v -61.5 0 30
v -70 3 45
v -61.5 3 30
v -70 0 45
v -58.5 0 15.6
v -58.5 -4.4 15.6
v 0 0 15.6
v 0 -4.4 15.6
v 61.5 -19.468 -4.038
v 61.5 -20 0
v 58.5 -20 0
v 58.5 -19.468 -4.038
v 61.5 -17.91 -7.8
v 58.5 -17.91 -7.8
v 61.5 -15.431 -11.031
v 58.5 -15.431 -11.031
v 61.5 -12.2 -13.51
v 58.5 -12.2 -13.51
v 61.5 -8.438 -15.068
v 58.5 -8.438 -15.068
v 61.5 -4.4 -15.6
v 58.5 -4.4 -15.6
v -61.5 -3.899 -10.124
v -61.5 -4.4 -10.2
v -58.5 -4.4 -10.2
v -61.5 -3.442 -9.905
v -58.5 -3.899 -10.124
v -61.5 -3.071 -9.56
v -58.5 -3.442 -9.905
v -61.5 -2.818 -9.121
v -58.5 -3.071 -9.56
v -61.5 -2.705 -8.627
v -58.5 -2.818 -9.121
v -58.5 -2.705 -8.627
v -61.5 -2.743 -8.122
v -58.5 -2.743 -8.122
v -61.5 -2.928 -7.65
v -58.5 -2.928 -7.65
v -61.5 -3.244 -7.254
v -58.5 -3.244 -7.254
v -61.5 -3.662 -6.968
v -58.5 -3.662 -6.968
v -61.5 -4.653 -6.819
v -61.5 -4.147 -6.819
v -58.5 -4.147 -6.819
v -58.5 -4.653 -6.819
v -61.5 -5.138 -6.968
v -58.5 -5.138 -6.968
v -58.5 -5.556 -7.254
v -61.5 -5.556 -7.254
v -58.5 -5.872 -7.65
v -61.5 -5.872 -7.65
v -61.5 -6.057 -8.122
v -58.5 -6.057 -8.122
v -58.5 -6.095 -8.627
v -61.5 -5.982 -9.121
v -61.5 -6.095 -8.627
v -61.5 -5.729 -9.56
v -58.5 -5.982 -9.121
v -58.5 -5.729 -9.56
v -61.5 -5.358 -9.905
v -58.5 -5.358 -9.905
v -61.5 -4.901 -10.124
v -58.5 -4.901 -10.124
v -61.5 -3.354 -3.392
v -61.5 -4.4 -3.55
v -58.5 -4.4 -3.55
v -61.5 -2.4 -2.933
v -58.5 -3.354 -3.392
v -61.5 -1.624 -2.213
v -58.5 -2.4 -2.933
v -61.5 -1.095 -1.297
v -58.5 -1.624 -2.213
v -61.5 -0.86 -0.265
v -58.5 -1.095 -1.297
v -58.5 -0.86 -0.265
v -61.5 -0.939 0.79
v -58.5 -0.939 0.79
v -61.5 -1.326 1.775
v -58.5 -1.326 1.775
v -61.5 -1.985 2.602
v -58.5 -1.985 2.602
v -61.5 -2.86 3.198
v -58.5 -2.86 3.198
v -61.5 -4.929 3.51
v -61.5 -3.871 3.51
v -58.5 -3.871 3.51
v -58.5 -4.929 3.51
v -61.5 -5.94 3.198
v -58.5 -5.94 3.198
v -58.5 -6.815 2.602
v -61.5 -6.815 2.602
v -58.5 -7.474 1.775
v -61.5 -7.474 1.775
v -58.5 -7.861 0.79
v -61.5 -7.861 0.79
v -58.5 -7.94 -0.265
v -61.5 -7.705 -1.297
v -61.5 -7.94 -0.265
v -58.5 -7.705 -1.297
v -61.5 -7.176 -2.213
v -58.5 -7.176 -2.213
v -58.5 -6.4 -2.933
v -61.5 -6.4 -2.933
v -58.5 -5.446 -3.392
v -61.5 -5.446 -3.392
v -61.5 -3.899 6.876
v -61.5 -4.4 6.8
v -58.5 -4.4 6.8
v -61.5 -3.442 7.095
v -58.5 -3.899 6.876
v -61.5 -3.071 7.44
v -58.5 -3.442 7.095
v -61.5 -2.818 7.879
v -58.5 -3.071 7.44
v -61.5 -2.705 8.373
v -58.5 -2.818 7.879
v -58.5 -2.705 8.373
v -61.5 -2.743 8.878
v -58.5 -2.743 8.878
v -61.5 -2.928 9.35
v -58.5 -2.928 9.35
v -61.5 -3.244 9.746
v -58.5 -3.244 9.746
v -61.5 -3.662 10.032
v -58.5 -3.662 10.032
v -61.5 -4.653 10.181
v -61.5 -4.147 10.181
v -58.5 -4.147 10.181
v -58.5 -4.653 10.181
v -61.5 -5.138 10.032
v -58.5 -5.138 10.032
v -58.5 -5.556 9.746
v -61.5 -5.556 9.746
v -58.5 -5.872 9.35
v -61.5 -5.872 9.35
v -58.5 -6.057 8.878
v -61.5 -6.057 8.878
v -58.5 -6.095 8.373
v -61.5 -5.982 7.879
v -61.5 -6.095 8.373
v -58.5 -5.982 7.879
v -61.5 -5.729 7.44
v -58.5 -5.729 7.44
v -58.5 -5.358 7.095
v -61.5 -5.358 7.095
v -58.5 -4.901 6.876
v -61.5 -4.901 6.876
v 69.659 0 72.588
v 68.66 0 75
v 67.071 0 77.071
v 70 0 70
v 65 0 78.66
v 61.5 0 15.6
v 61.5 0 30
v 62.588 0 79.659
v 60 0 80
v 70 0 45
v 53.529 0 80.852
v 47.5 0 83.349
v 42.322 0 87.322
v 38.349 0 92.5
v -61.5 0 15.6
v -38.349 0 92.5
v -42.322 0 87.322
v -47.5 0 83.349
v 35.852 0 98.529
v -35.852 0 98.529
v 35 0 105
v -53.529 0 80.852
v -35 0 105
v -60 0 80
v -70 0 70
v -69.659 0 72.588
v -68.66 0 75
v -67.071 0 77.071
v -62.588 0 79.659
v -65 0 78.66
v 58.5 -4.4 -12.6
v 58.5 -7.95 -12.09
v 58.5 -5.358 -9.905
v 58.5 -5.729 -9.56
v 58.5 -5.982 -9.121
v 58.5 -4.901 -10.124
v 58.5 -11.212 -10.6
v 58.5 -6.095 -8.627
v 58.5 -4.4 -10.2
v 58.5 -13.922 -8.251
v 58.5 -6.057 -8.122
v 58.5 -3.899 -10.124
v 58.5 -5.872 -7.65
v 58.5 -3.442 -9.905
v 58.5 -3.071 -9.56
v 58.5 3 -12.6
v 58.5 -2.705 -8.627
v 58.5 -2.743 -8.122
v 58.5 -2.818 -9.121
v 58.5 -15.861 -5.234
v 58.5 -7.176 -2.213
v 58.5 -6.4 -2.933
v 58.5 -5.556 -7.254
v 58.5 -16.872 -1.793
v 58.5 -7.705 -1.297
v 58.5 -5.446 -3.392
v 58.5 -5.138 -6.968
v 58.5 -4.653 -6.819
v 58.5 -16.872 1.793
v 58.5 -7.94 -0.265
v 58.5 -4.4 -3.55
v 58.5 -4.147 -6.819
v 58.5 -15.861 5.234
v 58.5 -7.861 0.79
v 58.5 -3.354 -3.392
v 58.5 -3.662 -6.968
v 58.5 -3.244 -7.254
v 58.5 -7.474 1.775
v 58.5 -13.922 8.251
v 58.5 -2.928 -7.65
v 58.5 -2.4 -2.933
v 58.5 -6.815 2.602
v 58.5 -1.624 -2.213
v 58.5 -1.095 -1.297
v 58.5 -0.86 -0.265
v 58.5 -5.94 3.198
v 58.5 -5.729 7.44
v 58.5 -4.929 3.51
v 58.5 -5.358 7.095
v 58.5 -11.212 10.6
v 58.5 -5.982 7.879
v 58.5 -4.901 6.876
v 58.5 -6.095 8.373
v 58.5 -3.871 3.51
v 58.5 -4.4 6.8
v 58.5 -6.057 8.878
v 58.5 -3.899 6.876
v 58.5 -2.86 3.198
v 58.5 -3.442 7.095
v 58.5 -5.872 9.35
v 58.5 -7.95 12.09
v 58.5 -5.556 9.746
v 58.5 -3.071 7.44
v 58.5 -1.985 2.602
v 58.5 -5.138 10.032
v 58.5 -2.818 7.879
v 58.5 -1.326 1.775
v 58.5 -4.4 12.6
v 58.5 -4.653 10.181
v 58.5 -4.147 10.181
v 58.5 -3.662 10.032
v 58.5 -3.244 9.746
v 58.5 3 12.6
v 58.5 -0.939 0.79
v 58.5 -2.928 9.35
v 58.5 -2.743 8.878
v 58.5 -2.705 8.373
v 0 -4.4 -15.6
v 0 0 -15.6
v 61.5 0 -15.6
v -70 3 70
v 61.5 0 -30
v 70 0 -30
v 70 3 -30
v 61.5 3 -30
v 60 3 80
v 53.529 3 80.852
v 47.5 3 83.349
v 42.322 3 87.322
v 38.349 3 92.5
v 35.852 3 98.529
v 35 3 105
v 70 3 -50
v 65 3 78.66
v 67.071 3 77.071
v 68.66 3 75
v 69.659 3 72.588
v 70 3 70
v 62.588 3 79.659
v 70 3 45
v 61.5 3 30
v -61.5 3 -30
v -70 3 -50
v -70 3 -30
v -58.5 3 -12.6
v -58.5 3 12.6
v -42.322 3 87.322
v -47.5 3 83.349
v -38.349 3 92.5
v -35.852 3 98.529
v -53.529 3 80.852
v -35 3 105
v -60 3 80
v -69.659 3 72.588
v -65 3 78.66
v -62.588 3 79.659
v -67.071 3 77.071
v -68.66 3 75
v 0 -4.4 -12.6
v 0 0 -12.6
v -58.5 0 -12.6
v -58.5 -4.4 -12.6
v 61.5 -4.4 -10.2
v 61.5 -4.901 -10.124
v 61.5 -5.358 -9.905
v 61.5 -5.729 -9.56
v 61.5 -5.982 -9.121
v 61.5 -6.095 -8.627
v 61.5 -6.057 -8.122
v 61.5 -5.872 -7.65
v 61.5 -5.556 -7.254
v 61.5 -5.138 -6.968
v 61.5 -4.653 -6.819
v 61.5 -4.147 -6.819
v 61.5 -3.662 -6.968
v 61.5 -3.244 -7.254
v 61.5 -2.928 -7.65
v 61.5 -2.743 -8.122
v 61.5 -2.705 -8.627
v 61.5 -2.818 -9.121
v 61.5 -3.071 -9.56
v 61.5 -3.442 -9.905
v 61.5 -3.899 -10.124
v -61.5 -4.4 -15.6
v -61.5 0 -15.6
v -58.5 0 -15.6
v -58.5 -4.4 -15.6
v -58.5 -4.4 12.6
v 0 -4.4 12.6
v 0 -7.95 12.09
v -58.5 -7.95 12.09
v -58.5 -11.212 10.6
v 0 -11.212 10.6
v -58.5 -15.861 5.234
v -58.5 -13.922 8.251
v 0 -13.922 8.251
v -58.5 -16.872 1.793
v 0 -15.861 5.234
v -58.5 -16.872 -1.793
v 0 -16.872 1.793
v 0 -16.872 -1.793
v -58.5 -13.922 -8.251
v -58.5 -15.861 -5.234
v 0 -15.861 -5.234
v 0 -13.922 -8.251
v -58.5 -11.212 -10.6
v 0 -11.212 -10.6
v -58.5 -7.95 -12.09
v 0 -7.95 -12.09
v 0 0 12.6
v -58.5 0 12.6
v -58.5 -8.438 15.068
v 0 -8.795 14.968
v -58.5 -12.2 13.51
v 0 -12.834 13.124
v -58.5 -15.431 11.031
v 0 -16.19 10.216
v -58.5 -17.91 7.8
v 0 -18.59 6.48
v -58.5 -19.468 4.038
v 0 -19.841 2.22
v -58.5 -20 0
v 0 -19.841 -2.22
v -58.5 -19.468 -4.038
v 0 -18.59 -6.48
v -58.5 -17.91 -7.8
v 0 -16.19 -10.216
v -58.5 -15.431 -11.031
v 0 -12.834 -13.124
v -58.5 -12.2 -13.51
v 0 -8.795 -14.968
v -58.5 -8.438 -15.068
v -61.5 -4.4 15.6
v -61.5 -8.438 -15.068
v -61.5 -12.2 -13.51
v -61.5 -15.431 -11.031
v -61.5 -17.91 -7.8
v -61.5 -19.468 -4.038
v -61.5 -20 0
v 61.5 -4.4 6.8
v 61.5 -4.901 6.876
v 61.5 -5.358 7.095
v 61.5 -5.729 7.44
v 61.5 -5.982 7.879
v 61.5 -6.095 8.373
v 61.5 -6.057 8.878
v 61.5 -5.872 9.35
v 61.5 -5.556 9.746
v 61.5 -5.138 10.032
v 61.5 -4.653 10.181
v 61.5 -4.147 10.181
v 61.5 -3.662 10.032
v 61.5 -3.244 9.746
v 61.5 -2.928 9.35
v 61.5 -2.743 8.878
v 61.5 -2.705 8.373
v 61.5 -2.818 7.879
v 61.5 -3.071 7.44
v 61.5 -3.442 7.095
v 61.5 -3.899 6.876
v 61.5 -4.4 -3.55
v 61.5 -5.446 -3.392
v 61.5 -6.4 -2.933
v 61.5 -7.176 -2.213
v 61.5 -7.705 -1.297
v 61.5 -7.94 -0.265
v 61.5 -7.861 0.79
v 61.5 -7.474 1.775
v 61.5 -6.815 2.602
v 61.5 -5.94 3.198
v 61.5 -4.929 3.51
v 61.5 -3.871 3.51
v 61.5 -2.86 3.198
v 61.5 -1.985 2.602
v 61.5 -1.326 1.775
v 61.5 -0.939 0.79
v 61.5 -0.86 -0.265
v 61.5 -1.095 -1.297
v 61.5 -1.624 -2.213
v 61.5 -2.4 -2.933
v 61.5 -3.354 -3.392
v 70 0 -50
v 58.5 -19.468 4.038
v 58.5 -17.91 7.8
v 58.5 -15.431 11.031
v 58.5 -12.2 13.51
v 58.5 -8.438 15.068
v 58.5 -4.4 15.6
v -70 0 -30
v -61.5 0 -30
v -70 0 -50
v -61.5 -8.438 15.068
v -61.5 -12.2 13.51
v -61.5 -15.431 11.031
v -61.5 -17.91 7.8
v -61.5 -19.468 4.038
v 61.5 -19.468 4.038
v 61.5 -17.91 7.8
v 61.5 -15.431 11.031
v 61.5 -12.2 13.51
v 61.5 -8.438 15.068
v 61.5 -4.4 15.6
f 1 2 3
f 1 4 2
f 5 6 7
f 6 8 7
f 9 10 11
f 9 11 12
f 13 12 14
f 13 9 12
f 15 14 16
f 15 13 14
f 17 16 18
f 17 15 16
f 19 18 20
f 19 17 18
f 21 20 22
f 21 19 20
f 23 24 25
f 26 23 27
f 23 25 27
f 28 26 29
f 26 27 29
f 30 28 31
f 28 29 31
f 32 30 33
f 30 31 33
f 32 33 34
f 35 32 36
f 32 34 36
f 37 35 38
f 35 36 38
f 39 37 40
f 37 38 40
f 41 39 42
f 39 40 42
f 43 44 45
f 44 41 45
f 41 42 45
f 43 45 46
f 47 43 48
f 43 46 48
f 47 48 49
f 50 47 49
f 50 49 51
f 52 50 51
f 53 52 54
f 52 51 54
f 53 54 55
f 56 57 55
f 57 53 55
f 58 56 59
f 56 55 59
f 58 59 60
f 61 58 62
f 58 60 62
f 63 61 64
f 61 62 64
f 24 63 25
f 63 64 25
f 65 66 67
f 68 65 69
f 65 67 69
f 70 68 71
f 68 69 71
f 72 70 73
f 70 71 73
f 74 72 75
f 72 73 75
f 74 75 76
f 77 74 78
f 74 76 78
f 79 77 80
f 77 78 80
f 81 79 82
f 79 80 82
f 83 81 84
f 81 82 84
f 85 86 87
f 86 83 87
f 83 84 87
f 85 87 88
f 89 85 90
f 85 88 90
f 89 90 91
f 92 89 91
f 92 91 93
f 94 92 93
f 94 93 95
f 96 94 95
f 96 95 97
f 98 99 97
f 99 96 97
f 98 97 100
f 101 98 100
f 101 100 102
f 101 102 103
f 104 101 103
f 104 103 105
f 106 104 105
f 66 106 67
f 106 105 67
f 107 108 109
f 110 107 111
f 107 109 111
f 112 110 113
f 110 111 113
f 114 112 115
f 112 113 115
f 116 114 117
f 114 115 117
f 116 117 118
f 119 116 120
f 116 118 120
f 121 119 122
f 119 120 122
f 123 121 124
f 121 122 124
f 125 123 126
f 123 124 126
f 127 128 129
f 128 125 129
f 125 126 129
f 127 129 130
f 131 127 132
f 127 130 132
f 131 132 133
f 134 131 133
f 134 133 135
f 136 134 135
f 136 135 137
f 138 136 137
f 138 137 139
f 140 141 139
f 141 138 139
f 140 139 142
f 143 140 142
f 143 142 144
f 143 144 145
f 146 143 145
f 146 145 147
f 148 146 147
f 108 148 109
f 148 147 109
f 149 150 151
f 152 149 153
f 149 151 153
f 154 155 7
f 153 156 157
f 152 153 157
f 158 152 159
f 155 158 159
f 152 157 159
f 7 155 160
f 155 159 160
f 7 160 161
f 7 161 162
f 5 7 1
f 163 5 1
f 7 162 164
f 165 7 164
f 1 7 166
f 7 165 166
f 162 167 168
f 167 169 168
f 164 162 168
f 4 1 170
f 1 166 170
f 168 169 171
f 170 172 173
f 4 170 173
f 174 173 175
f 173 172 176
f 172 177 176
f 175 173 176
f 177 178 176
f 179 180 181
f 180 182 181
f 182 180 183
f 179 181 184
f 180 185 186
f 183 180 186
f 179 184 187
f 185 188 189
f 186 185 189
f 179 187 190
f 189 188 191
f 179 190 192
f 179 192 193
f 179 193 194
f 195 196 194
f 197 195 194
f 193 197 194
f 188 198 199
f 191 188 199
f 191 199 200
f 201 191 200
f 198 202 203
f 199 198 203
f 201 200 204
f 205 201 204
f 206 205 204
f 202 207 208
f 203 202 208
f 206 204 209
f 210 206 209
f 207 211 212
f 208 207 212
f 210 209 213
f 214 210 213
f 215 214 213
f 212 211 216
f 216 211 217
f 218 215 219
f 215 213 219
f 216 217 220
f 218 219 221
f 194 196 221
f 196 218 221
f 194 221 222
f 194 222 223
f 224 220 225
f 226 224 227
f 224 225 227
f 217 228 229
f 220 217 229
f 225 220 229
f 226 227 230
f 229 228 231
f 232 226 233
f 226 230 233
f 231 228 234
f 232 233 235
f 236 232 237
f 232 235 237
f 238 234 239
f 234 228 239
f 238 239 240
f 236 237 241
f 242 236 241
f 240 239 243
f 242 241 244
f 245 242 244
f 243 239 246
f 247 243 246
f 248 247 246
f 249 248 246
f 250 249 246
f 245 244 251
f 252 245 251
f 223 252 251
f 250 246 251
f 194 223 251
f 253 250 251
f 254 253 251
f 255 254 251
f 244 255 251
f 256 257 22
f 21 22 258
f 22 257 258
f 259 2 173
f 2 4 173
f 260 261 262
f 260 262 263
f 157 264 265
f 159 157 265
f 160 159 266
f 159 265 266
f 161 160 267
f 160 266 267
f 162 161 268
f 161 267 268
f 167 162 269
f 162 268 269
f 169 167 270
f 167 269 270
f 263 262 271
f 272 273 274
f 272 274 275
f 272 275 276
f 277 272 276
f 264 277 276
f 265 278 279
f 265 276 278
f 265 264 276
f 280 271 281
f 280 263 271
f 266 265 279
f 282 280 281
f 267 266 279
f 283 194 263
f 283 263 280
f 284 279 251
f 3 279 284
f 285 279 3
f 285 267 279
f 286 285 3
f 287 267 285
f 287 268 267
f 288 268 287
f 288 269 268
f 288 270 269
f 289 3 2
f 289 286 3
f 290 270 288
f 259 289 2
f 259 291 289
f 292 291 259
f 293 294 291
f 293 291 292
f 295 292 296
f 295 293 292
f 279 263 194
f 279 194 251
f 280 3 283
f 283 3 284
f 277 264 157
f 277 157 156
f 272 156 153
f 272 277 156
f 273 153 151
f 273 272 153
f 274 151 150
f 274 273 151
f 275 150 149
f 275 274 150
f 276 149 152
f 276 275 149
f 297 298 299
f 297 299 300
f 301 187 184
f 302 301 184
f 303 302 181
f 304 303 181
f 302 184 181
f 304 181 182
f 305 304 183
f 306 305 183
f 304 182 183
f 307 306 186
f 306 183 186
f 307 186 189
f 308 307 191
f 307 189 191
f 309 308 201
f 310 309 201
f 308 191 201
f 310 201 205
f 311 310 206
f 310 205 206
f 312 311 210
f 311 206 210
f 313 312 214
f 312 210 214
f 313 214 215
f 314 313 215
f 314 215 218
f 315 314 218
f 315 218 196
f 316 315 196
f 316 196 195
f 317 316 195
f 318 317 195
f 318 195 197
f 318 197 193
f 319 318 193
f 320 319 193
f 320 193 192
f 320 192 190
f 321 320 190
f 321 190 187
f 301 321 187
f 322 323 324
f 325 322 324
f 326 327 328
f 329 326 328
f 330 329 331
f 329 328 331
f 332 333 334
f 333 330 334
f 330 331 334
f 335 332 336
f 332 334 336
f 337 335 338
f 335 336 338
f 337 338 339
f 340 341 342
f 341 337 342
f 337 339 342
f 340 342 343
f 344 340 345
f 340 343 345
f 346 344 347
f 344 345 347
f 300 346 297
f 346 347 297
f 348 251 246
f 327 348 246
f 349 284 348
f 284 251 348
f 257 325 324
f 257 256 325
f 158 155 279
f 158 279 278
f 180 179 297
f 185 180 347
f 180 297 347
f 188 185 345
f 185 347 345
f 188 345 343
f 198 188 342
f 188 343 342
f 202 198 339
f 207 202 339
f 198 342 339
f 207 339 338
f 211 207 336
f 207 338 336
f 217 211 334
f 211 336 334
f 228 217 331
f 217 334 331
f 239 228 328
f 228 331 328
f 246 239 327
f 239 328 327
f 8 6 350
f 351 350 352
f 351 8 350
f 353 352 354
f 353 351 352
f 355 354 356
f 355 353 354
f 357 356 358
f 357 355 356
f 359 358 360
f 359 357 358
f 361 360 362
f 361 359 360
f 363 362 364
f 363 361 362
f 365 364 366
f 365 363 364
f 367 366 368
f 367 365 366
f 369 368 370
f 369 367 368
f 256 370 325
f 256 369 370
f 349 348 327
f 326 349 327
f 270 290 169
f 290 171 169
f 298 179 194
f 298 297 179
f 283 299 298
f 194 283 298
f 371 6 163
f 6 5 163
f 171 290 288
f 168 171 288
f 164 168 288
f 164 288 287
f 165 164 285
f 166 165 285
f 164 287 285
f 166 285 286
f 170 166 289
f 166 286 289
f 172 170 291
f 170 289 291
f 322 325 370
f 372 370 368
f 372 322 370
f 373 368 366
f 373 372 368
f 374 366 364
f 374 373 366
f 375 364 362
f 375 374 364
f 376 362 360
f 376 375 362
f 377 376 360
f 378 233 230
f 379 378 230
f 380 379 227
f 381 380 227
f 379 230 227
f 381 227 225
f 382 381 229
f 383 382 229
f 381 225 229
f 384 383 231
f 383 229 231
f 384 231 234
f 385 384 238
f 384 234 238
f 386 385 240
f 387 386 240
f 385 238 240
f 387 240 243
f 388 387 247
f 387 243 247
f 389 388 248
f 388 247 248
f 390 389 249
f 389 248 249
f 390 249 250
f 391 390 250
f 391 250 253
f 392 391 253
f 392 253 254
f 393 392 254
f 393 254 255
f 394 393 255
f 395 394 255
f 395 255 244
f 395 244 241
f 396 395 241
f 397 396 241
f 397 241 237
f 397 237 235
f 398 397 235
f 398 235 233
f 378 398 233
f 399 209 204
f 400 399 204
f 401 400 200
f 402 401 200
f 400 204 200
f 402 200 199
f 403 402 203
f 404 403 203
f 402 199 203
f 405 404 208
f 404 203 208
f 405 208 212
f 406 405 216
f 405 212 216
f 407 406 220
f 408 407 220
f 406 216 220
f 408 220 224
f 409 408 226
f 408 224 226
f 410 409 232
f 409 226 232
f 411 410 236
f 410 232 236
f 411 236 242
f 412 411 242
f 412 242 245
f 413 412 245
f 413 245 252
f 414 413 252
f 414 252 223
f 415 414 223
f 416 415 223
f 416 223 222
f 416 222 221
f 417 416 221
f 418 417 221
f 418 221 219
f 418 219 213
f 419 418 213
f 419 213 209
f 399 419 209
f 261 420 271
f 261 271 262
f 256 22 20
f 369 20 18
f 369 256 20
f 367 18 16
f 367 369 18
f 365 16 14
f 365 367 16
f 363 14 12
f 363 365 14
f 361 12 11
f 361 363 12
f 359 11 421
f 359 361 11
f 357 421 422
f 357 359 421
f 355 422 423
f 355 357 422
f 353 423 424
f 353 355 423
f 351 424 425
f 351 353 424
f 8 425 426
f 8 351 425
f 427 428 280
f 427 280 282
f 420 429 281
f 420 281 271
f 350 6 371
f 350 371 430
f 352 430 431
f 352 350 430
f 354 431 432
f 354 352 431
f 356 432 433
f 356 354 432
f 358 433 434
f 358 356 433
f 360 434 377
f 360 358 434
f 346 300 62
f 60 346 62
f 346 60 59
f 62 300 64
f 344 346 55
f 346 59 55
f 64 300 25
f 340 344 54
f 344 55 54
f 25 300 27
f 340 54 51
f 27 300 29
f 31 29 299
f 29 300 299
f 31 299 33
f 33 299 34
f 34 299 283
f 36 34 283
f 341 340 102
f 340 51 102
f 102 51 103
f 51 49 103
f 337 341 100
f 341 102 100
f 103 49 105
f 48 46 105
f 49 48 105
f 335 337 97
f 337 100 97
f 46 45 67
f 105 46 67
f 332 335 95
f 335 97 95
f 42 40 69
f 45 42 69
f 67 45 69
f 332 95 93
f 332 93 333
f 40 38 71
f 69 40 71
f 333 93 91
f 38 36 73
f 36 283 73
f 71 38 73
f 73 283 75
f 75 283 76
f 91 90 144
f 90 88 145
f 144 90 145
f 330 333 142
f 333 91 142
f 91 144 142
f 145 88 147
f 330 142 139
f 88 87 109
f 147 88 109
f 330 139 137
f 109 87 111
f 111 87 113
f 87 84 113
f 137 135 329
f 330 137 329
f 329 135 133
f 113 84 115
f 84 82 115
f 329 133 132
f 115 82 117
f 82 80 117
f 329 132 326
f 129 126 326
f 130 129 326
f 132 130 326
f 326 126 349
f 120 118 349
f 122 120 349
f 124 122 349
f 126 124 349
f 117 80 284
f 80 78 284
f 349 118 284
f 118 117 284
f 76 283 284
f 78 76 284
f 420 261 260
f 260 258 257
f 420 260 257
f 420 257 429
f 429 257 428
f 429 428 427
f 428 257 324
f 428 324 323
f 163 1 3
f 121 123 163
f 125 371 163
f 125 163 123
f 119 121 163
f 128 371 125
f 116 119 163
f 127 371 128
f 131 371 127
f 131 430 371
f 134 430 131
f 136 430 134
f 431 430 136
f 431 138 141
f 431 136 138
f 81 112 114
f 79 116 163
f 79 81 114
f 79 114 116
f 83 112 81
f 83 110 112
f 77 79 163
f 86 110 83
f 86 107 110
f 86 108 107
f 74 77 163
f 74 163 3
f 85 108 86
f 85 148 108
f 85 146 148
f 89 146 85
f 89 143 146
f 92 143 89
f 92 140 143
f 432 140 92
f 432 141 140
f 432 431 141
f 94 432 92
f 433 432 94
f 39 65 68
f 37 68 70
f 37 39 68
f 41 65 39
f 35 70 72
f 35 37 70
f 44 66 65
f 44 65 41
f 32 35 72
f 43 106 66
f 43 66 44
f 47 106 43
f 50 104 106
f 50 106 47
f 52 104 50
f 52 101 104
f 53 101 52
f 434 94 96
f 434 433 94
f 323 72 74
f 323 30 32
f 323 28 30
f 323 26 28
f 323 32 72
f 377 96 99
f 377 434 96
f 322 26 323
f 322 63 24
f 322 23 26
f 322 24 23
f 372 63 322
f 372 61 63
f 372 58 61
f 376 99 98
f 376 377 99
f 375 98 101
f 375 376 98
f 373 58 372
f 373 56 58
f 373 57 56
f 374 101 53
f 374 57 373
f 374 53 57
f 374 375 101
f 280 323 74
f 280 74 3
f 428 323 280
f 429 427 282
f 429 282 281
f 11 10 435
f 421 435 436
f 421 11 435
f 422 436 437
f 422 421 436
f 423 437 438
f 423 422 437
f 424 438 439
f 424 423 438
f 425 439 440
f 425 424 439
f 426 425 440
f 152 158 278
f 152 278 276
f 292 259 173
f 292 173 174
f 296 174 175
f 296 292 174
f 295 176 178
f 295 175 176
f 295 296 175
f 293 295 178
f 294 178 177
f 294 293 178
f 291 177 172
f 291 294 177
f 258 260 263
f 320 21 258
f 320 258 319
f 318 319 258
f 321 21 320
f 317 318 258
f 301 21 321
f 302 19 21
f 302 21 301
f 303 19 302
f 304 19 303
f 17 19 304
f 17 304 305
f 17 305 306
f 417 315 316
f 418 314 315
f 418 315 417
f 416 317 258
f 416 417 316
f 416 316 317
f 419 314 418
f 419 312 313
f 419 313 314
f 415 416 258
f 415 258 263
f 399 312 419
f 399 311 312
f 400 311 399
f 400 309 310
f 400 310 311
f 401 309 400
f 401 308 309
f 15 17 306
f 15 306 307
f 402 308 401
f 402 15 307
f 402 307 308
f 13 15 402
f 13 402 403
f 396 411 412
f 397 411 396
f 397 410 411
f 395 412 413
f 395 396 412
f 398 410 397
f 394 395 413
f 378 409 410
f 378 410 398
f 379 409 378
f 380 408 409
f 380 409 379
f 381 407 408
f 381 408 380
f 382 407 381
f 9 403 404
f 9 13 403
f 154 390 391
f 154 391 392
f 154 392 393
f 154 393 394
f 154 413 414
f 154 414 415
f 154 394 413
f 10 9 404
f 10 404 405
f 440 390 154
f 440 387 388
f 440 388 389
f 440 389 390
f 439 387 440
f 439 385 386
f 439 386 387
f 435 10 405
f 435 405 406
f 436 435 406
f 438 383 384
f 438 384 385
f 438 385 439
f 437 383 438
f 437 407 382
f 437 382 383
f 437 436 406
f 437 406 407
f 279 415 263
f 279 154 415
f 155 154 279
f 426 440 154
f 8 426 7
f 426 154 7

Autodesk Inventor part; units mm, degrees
ref_plane "YZ Plane" through (0, 0, 0) normal (1, 0, 0) x (0, 1, 0)
ref_plane "XZ Plane" through (0, 0, 0) normal (0, 1, 0) x (-1, 0, 0)
ref_plane "XY Plane" through (0, 0, 0) normal (0, 0, 1) x (1, 0, 0)
sketch "Sketch1" plane through (0, 0, 0) normal (0, 1, 0) x (-1, 0, 0)
  line L0 (70, 45) -> (61.5, 30)
  line L1 (61.5, 30) -> (61.5, -30)
  line L2 (61.5, -30) -> (70, -30)
  line L3 (70, -30) -> (70, -50)
  line L4 (70, -50) -> (-70, -50)
  line L5 (-70, -50) -> (-70, -30)
  line L6 (-70, -30) -> (-61.5, -30)
  line L7 (-61.5, -30) -> (-61.5, 30)
  line L8 (-61.5, 30) -> (-70, 45)
  line L9 (70, 45) -> (70, 80)
  line L10 (-70, 45) -> (-70, 80)
  line L11 (35, 105) -> (-35, 105)
  line L12 (-98, 0) -> (98, 0) projected
  line L13 (0, -81) -> (0, 136) projected
  line L14 (70, 80) -> (35, 80)
  line L15 (35, 80) -> (35, 105)
  line L16 (-35, 105) -> (-35, 80)
  line L17 (-35, 80) -> (-70, 80)
  point P0 (0, 0)
  dimension "d0" = 60
  dimension "d1" = 60
  dimension "d2" = 123
  dimension "d3" = 140
  dimension "d4" = 20
  dimension "d5" = 140
  dimension "d8" = 35
  dimension "d15" = 30
  dimension "d45" = 15
  dimension "d46" = 15
  dimension "d47" = 35
  dimension "d48" = 70
  dimension "d49" = 155
extrude "Extrusion1" add sketch "Sketch1" along normal blind 3
sketch "Sketch2" plane through (0, 0, 0) normal (0, -1, 0) x (1, 0, 0)
  line L0 (-98, 0) -> (98, 0) projected
  line L1 (0, 136) -> (0, -81) projected
  line L2 (61.5, 15.6) -> (58.5, 15.6)
  line L3 (58.5, 15.6) -> (58.5, -15.6)
  line L4 (58.5, -15.6) -> (61.5, -15.6)
  line L5 (61.5, -15.6) -> (61.5, 15.6)
  line L6 (61.5, 30) -> (61.5, -30) projected
  point P0 (0, 0)
  dimension "d18" = 3
  dimension "d19" = 31.2
extrude "Extrusion2" add sketch "Sketch2" along normal blind 20
sketch "Sketch3" plane through (61.5, 0, -30) normal (1, 0, 0) x (0, 0, -1)
  line L0 (-45.6, 0) -> (-45.6, -20) projected
  line L1 (-14.4, -20) -> (-45.6, -20) projected
  line L2 (-30, -24.6) -> (-30, 7.6) projected
  point P0 (-30, 0)
  point P1 (-38.5, -4.4)
  point P2 (-21.5, -4.4)
  dimension "d22" = 17
  dimension "d23" = 15.6
hole "Hole1" at (61.5, -4.4, 8.5) at (61.5, -4.4, -8.5) direction (-1, 0, 0) diameter 3.4 end through all clearance for "Countersunk Flat Head Screw ISO 2009/7046" size "M3" standard "ISO"
sketch "Sketch4" plane through (61.5, 0, -30) normal (1, 0, 0) x (0, 0, -1)
  line L0 (-30, -24.6) -> (-30, 7.6) projected
  circle A0 centre (-38.5, -4.4) radius 1.7 projected
  circle A1 centre (-21.5, -4.4) radius 1.7 projected
  line L1 (-38.5, -4.4) -> (-21.5, -4.4) construction
  point P0 (-30, 0)
  point P1 (-30, -4.4)
hole "Hole2" at (61.5, -4.4, 0) direction (-1, 0, 0) diameter 7.1 end through all
fillet "Fillet1" radius 15.6 2 edges at (60, -20, -15.6) (60, -20, 15.6)
sketch "Sketch5" plane through (0, 0, 0) normal (1, 0, 0) x (0, 1, 0)
  line L0 (-24, 0) -> (4, 0) projected
  circle A0 centre (-4.4, 0) radius 3.55 projected
  arc A1 (-4.4, 12.6) -> (-4.4, -12.6) centre (-4.4, 0) ccw
  arc A2 (-4.4, 15.6) -> (-4.4, -15.6) centre (-4.4, 0) ccw
  line L1 (0, -15.6) -> (-4.4, -15.6) projected
  line L2 (-4.4, -15.6) -> (0, -15.6)
  line L3 (0, 30) -> (0, 15.6) projected
  line L4 (0, 15.6) -> (-4.4, 15.6) projected
  line L5 (-4.4, 15.6) -> (0, 15.6)
  line L6 (0, -15.6) -> (0, 15.6) projected
  line L7 (0, 15.6) -> (0, -15.6)
  line L8 (-4.4, 12.6) -> (0, 12.6)
  line L9 (-4.4, -12.6) -> (0, -12.6)
  point P0 (0, 0)
  point P1 (0, -12.6)
  point P2 (0, 12.6)
  dimension "d39" = 25.2
  dimension "d40" = 3
extrude "Extrusion3" add sketch "Sketch5" along normal up to surface (58.5 mm away) contours A2 L4 L6 L8 A1 L0 | L0 A1 L9 L6 L1 A2
sketch "Sketch6" plane through (0, 0, 0) normal (1, 0, 0) x (0, 1, 0)
  line L0 (0, 42) -> (0, -42) projected
  line L1 (-5.88, 0) -> (4.48, 0) projected
  line L2 (3, 12.6) -> (0, 12.6)
  line L3 (0, 12.6) -> (0, -12.6)
  line L4 (0, -12.6) -> (3, -12.6)
  line L5 (3, -12.6) -> (3, 12.6)
  line L6 (0, -12.6) -> (-4.4, -12.6) projected
  line L7 (-4.4, 12.6) -> (0, 12.6) projected
  line L8 (3, -30) -> (3, 30) projected
  line L9 (0, -30) -> (0, 30) projected
  point P0 (0, 0)
  point P1 (0, 12.6)
  point P2 (0, -12.6)
extrude "Extrusion4" cut sketch "Sketch6" along normal mid plane 117
mirror "Mirror1" about plane through (0, 0, 0) normal (1, 0, 0) of "Hole1", "Hole2", "Extrusion2", "Fillet1", "Extrusion3"
fillet "Fillet2" radius 25 2 edges at (35, 1.5, 80) (-35, 1.5, 80)
fillet "Fillet3" radius 10 2 edges at (70, 1.5, 80) (-70, 1.5, 80)
properties part number "karoserie1"
